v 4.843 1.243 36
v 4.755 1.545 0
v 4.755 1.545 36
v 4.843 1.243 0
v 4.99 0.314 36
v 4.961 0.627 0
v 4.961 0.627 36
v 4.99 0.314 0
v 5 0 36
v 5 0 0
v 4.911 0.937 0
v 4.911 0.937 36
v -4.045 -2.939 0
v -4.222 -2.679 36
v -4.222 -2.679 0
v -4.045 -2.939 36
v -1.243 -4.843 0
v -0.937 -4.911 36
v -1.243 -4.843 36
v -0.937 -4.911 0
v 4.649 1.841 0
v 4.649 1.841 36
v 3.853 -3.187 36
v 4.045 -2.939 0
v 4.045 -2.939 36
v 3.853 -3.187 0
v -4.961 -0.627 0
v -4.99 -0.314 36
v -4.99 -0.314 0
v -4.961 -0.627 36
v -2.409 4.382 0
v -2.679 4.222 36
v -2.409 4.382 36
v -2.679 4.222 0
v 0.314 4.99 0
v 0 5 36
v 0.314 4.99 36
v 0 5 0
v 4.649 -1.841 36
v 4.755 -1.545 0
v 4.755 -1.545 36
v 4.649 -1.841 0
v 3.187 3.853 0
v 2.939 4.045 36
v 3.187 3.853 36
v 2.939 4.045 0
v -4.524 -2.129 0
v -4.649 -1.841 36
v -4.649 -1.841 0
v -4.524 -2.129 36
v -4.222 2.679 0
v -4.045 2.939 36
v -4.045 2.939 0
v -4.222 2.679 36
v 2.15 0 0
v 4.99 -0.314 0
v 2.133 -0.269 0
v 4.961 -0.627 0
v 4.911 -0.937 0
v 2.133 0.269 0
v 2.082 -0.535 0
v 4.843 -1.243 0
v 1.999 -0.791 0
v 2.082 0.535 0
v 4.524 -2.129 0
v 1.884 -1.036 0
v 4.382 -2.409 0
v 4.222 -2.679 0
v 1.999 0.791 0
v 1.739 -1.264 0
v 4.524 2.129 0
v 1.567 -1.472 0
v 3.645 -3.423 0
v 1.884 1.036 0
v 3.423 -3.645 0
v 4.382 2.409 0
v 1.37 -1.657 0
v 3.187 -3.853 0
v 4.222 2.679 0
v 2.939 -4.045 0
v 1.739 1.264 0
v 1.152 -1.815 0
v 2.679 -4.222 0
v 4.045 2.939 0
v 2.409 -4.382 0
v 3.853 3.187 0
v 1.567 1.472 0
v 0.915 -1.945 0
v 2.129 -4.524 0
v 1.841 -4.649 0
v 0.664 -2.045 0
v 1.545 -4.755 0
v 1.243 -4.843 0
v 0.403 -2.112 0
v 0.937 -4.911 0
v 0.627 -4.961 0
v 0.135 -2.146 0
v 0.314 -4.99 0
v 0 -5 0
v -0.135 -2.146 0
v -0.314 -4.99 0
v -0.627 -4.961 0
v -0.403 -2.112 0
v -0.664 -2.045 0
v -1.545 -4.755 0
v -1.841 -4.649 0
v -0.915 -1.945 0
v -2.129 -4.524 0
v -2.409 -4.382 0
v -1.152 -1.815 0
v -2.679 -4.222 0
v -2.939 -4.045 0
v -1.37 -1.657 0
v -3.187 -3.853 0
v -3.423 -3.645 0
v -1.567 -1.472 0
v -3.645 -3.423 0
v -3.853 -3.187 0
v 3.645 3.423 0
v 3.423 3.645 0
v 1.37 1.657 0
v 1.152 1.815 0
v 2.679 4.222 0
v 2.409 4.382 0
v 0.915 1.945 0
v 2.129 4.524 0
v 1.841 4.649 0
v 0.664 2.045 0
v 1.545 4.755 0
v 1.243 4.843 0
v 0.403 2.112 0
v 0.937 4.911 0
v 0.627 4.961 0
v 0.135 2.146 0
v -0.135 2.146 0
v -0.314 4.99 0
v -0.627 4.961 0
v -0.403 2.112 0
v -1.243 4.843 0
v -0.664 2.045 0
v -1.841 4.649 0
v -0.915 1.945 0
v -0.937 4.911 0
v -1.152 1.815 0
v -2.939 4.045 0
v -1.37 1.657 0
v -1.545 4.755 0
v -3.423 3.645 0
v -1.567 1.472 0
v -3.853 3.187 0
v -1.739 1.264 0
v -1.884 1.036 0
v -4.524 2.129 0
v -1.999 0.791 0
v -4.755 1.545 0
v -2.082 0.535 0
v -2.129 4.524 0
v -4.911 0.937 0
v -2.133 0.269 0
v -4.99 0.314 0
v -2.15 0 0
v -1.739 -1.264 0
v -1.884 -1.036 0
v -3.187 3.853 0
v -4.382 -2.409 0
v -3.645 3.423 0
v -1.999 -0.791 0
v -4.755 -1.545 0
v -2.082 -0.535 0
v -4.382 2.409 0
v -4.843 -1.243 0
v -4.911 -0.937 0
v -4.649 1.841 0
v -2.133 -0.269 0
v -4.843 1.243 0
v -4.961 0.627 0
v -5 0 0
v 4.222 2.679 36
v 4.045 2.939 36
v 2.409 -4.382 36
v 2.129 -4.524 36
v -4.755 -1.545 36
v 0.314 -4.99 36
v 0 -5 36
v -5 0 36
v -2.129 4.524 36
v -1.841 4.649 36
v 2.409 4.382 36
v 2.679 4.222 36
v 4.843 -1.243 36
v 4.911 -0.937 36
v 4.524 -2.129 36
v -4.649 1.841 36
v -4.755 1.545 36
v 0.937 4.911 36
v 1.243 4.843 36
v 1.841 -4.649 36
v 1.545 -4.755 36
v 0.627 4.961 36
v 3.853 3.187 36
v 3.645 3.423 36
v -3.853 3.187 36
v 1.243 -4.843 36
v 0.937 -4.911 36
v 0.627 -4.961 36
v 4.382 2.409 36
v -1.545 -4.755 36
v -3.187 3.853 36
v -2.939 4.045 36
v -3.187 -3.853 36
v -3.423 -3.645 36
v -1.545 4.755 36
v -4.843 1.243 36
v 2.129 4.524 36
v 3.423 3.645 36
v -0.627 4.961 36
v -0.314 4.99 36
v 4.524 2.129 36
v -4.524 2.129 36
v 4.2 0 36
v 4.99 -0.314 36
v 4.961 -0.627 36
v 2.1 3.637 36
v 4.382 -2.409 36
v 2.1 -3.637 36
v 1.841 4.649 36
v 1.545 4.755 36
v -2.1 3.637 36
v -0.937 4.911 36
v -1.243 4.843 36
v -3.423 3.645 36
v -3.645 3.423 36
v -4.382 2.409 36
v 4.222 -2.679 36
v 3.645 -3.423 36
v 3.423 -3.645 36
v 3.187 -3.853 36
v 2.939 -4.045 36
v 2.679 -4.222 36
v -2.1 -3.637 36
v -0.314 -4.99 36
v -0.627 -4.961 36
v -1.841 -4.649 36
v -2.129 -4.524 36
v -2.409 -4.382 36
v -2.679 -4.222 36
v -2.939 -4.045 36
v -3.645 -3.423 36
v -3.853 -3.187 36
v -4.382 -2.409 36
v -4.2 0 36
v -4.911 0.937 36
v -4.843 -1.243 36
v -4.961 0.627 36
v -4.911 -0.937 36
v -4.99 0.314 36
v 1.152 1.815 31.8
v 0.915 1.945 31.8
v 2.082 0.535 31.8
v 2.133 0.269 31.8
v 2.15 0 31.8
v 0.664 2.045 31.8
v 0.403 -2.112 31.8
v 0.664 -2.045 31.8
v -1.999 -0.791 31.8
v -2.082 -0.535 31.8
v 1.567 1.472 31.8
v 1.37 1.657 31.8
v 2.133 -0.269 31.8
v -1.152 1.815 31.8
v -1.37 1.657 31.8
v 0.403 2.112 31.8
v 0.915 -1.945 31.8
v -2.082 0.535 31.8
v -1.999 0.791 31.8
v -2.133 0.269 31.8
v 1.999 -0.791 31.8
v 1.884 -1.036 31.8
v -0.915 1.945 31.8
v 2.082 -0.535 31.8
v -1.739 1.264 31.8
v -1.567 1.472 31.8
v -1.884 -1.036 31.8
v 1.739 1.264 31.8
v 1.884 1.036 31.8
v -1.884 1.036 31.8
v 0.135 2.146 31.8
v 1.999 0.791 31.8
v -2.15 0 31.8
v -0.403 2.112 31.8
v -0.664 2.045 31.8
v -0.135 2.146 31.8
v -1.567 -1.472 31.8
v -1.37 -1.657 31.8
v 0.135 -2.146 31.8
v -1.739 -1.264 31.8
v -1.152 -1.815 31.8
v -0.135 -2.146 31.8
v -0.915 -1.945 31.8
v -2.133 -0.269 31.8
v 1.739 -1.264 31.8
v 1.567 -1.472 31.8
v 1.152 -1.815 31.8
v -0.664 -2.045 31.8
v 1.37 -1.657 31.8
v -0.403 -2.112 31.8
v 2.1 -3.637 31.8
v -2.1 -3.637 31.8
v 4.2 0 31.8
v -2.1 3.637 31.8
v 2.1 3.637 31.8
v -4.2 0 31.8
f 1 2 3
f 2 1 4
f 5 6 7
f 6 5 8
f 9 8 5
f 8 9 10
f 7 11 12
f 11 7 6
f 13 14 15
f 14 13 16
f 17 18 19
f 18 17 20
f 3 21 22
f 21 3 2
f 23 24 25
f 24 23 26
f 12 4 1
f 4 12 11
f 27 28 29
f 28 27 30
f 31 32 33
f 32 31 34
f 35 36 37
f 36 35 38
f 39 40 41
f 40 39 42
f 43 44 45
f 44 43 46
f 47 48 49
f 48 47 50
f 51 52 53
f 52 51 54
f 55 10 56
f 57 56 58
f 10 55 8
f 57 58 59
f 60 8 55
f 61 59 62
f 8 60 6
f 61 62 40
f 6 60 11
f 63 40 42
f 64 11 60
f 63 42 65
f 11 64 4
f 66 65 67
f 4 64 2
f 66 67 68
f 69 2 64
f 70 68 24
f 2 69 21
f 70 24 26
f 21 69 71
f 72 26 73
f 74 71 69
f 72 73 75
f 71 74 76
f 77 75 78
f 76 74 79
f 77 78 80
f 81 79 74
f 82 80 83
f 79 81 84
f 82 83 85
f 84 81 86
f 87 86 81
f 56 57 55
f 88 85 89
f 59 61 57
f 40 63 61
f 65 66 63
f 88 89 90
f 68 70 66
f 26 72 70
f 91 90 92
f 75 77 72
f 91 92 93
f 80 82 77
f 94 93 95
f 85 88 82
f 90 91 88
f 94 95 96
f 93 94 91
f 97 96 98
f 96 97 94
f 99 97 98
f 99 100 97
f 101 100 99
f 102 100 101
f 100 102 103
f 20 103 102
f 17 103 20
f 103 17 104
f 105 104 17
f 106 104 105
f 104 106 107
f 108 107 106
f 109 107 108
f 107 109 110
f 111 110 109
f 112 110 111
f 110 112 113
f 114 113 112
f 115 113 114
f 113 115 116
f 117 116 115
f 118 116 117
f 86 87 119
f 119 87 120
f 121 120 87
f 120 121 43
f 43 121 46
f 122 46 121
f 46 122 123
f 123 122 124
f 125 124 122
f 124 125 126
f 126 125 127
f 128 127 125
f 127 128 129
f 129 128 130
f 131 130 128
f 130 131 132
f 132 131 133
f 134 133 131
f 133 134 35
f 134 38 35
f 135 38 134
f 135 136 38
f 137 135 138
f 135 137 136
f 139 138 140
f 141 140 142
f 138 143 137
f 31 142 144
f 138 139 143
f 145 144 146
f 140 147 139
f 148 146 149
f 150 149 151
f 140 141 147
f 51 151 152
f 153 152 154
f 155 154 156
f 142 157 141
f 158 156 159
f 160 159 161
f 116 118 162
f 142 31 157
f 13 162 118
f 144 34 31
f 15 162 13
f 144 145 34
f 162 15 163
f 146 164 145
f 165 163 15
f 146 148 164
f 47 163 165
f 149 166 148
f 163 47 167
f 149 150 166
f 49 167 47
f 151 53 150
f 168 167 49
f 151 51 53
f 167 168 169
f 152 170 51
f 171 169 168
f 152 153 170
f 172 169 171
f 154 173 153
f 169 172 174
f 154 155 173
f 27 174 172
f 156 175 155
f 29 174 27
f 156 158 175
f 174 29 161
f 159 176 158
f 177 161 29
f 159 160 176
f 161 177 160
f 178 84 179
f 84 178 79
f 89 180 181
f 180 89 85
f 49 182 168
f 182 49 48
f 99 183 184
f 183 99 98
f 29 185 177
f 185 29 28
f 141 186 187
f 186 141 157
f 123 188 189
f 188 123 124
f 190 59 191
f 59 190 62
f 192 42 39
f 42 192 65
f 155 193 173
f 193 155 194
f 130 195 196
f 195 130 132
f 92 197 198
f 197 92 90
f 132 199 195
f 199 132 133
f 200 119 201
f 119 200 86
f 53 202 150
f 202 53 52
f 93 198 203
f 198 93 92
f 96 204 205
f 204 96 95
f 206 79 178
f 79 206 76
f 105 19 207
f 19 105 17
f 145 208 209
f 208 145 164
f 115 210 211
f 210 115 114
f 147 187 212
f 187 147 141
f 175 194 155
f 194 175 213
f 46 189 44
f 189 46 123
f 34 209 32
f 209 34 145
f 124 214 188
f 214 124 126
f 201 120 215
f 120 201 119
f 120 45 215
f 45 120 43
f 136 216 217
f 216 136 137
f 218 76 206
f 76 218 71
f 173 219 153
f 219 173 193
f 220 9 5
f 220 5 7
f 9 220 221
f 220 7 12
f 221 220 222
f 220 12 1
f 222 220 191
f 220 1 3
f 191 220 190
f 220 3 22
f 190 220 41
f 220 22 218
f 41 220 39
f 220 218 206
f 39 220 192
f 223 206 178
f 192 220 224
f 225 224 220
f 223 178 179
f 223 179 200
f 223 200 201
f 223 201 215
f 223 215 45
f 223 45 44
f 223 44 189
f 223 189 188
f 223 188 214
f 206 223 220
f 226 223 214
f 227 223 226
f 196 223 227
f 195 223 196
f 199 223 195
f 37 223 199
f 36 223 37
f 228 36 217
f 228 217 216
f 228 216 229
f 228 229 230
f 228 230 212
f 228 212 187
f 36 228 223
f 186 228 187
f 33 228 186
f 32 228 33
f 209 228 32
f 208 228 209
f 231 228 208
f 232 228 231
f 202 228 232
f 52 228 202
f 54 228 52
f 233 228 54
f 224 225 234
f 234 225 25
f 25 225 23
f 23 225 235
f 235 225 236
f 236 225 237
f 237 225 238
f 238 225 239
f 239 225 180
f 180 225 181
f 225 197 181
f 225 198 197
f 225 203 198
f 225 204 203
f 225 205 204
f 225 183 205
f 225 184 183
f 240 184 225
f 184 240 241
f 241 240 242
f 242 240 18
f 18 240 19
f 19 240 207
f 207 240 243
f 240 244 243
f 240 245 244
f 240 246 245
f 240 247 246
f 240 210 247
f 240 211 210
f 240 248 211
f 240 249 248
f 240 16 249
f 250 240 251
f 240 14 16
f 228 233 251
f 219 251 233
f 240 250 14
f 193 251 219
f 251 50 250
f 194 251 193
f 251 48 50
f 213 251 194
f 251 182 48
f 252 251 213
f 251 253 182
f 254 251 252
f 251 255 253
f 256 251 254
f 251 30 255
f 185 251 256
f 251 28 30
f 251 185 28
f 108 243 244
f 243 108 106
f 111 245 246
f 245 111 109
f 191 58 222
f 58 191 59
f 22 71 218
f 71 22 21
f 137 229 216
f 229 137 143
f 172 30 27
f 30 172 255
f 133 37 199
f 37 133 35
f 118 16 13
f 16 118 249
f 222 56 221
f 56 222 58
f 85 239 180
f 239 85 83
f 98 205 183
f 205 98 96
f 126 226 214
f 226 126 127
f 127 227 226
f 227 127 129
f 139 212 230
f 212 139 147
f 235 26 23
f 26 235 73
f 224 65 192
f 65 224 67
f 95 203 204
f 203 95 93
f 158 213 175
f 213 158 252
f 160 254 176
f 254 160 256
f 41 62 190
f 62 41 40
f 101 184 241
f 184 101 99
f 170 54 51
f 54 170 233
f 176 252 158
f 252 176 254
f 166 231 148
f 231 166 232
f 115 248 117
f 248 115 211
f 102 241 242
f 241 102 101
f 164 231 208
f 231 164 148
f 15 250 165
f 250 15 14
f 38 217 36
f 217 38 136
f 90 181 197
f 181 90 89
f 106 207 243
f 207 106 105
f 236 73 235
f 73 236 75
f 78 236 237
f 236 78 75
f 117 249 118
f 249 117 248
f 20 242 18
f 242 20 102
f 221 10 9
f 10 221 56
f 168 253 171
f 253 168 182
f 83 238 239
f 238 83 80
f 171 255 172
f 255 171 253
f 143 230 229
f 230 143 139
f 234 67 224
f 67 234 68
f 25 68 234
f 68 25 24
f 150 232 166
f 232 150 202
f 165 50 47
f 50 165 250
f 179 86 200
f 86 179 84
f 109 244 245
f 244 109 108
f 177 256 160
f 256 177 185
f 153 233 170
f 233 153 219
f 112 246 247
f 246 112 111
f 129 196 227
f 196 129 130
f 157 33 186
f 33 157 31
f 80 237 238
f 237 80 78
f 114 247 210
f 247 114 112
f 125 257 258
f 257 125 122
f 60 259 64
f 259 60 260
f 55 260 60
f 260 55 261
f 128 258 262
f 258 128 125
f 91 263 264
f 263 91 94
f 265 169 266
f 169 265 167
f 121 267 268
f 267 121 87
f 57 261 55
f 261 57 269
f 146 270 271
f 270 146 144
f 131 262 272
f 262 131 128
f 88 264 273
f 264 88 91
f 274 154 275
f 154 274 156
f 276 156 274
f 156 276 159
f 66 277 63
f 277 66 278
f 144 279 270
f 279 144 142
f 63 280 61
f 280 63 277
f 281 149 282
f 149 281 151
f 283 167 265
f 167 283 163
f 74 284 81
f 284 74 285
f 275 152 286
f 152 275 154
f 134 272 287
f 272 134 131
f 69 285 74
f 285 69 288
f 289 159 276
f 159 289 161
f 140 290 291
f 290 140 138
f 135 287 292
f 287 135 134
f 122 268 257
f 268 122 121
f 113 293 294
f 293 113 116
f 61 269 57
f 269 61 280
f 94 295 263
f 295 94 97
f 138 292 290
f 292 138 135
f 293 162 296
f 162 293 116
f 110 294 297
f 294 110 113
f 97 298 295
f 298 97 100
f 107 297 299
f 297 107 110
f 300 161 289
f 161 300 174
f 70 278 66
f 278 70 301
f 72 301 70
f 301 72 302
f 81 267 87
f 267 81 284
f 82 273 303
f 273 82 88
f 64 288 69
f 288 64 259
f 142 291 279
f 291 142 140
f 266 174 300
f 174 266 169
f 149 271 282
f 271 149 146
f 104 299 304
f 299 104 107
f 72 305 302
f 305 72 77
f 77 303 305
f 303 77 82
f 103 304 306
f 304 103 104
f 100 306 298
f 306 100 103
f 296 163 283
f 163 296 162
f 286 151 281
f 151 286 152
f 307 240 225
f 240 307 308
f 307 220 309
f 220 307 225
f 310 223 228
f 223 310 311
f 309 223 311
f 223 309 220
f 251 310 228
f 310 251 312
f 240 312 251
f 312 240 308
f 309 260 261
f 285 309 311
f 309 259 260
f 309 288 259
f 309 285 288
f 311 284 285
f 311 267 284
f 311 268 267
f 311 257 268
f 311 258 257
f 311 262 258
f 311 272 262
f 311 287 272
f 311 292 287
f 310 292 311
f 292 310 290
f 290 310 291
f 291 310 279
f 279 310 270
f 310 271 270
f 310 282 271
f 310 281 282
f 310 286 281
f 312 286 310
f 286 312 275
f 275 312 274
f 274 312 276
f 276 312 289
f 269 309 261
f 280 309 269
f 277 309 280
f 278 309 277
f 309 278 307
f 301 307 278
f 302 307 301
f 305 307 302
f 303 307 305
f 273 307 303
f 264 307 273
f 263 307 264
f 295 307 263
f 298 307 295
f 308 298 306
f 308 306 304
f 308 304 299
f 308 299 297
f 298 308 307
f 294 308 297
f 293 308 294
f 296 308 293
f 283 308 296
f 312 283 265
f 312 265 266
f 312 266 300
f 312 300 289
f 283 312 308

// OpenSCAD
// file: lib/naca4.scad
// Naca4.scad - library for parametric airfoils of 4 digit NACA series
// Code: Rudolf Huttary, Berlin 
// June 2015
// commercial use prohibited


// general use: for more examples refer to sampler.scad
// naca = naca digits or 3el vector  (default = 12 or [0, 0, .12])
// L    = chord length [mm]      (default= 100)
// N    = # sample points        (default= 81)
// h    = height [mm]            (default= 1)
// open = close at the thin end? (default = true)
// two equivalent example calls
 airfoil(naca = 2408, L = 60, N=1001, h = 30, open = false); 
// airfoil(naca = [.2, .4, .32], L = 60, N=1001, h = 30, open = false); 

module help()
{
  echo(str("\n\nList of signatures in lib:\n=================\n", 
  "module airfoil(naca=2412, L = 100, N = 81, h = 1, open = false) - renders airfoil object\n", 
  "module airfoil(naca=[.2, .4, .12], L = 100, N = 81, h = 1, open = false) - renders airfoil object using percentage for camber,  camber distance and thicknes\n", 
  "function airfoil_data(naca=12, L = 100, N = 81, open = false)\n",
  "=================\n")); 
}

help(); 
// this is the object
module airfoil(naca=12, L = 100, N = 81, h = 1, open = false)
{
  linear_extrude(height = h)
  polygon(points = airfoil_data(naca, L, N, open)); 
}

module hollow_airfoil(lnaca=12, L = 100, N = 81, h = 1, open = false, wall_thickness = 1)
{
    if (open){
        linear_extrude(height = h)

        if (wall_thickness>0){
            difference(){
                polygon(points = airfoil_data(naca, L, N, false));
                offset(delta = - wall_thickness, chamfer = false) polygon(points = airfoil_data(naca, L, N, open = false));
            }
        }
        else{
            difference(){
                offset(delta = - wall_thickness, chamfer = false) polygon(points = airfoil_data(naca, L, N, open = false));
                polygon(points = airfoil_data(naca, L, N, false));
            }
        }
    }
    else{

        linear_extrude(height = abs(wall_thickness))
            polygon(points = airfoil_data(naca, L, N, false)); 

        linear_extrude(height = h)
            difference(){
                polygon(points = airfoil_data(naca, L, N, open));
                offset(delta = - wall_thickness) polygon(points = airfoil_data(naca, L, N, open = false));
            }

        translate([0,0, h - wall_thickness])
            linear_extrude(height = abs(wall_thickness))
                polygon(points = airfoil_data(naca, L, N, false)); 

    }
}


// this is the main function providing the airfoil data
function airfoil_data(naca=12, L = 100, N = 81, open = false) = 
  let(Na = len(naca)!=3?NACA(naca):naca)
  let(A = [.2969, -0.126, -.3516, .2843, open?-0.1015:-0.1036])
  [for (b=[-180:360/(N):179.99]) 
    let (x = (1-cos(b))/2)  
    let(yt = sign(b)*Na[2]/.2*(A*[sqrt(x), x, x*x, x*x*x, x*x*x*x])) 
    Na[0]==0?L*[x, yt]:L*camber(x, yt, Na[0], Na[1], sign(b))];  


function trailing_edge_angle(naca=12, open = false) = 
  let(Na = len(naca)!=3?NACA(naca):naca)
  let(A = [.2969, -0.126, -.3516, .2843, open?-0.1015:-0.1036])
  let (x =0.999)  // set x near to airfoil trailing edge
  let(yt = Na[2]/.2*(A*[sqrt(x), x, x*x, x*x*x, x*x*x*x])) // calculate distance from x-axis at previously set position
  atan2(yt,1-x);  // calculate angle of triangle between end of airfoil. The triange height corresponds to previously calculated distance from x-axis

function surface_angle(x = 0.5, naca=12, open = false) = 
  let(Na = len(naca)!=3?NACA(naca):naca)
  let(A = [0.2969, -0.126, -0.3516, 0.2843, open?-0.1015:-0.1036])
  let(dy = Na[2]/0.2*(A*[(1/2)*(1/sqrt(x)), 1, 2*x, 3*x*x, 4*x*x*x])) // calculate derivative of airfoil function at the x point
  atan(dy);  // calculate  the angle from function derivative

function surface_distance(x = 0.5, naca=12, open = false) = 
  let(Na = len(naca)!=3?NACA(naca):naca)
  let(A = [0.2969, -0.126, -0.3516, 0.2843, open?-0.1015:-0.1036])
  Na[2]/.2*(A*[sqrt(x), x, x*x, x*x*x, x*x*x*x]); // calculate distance from x-axis at previously set position

// helper functions
function NACA(naca) = 
  let (M = floor(naca/1000))
  let (P = floor((naca-M*1000)/100)) 
  [M/100, P/10, floor(naca-M*1000-P*100)/100];  

function camber(x, y, M, P, upper) = 
  let(yc = (x<P)?M/P/P*(2*P*x-x*x): M/(1-P)/(1-P)*(1 - 2*P + 2*P*x -x*x))
  let(dy = (x<P)?2*M/P/P*(P-x):2*M/(1-P)/(1-P)*(P-x))
  let(th = atan(dy))
  [upper ? x - y*sin(th):x + y*sin(th), upper ? yc + y*cos(th):yc - y*cos(th)];
// main file
use <./lib/naca4.scad>
include <../parameters.scad>


module 666_3067(){

height = 36;

    difference(){
        cylinder(d=10, h = height, $fn = 100);
        cylinder(d=M4_screw_diameter, h = 100, center= true, $fn = 50);

        translate([0,0,height - M4_nut_height - global_clearance])
            cylinder(d=M4_nut_diameter, h = 2*M4_nut_height, $fn = 6);
    }

}


666_3067();
